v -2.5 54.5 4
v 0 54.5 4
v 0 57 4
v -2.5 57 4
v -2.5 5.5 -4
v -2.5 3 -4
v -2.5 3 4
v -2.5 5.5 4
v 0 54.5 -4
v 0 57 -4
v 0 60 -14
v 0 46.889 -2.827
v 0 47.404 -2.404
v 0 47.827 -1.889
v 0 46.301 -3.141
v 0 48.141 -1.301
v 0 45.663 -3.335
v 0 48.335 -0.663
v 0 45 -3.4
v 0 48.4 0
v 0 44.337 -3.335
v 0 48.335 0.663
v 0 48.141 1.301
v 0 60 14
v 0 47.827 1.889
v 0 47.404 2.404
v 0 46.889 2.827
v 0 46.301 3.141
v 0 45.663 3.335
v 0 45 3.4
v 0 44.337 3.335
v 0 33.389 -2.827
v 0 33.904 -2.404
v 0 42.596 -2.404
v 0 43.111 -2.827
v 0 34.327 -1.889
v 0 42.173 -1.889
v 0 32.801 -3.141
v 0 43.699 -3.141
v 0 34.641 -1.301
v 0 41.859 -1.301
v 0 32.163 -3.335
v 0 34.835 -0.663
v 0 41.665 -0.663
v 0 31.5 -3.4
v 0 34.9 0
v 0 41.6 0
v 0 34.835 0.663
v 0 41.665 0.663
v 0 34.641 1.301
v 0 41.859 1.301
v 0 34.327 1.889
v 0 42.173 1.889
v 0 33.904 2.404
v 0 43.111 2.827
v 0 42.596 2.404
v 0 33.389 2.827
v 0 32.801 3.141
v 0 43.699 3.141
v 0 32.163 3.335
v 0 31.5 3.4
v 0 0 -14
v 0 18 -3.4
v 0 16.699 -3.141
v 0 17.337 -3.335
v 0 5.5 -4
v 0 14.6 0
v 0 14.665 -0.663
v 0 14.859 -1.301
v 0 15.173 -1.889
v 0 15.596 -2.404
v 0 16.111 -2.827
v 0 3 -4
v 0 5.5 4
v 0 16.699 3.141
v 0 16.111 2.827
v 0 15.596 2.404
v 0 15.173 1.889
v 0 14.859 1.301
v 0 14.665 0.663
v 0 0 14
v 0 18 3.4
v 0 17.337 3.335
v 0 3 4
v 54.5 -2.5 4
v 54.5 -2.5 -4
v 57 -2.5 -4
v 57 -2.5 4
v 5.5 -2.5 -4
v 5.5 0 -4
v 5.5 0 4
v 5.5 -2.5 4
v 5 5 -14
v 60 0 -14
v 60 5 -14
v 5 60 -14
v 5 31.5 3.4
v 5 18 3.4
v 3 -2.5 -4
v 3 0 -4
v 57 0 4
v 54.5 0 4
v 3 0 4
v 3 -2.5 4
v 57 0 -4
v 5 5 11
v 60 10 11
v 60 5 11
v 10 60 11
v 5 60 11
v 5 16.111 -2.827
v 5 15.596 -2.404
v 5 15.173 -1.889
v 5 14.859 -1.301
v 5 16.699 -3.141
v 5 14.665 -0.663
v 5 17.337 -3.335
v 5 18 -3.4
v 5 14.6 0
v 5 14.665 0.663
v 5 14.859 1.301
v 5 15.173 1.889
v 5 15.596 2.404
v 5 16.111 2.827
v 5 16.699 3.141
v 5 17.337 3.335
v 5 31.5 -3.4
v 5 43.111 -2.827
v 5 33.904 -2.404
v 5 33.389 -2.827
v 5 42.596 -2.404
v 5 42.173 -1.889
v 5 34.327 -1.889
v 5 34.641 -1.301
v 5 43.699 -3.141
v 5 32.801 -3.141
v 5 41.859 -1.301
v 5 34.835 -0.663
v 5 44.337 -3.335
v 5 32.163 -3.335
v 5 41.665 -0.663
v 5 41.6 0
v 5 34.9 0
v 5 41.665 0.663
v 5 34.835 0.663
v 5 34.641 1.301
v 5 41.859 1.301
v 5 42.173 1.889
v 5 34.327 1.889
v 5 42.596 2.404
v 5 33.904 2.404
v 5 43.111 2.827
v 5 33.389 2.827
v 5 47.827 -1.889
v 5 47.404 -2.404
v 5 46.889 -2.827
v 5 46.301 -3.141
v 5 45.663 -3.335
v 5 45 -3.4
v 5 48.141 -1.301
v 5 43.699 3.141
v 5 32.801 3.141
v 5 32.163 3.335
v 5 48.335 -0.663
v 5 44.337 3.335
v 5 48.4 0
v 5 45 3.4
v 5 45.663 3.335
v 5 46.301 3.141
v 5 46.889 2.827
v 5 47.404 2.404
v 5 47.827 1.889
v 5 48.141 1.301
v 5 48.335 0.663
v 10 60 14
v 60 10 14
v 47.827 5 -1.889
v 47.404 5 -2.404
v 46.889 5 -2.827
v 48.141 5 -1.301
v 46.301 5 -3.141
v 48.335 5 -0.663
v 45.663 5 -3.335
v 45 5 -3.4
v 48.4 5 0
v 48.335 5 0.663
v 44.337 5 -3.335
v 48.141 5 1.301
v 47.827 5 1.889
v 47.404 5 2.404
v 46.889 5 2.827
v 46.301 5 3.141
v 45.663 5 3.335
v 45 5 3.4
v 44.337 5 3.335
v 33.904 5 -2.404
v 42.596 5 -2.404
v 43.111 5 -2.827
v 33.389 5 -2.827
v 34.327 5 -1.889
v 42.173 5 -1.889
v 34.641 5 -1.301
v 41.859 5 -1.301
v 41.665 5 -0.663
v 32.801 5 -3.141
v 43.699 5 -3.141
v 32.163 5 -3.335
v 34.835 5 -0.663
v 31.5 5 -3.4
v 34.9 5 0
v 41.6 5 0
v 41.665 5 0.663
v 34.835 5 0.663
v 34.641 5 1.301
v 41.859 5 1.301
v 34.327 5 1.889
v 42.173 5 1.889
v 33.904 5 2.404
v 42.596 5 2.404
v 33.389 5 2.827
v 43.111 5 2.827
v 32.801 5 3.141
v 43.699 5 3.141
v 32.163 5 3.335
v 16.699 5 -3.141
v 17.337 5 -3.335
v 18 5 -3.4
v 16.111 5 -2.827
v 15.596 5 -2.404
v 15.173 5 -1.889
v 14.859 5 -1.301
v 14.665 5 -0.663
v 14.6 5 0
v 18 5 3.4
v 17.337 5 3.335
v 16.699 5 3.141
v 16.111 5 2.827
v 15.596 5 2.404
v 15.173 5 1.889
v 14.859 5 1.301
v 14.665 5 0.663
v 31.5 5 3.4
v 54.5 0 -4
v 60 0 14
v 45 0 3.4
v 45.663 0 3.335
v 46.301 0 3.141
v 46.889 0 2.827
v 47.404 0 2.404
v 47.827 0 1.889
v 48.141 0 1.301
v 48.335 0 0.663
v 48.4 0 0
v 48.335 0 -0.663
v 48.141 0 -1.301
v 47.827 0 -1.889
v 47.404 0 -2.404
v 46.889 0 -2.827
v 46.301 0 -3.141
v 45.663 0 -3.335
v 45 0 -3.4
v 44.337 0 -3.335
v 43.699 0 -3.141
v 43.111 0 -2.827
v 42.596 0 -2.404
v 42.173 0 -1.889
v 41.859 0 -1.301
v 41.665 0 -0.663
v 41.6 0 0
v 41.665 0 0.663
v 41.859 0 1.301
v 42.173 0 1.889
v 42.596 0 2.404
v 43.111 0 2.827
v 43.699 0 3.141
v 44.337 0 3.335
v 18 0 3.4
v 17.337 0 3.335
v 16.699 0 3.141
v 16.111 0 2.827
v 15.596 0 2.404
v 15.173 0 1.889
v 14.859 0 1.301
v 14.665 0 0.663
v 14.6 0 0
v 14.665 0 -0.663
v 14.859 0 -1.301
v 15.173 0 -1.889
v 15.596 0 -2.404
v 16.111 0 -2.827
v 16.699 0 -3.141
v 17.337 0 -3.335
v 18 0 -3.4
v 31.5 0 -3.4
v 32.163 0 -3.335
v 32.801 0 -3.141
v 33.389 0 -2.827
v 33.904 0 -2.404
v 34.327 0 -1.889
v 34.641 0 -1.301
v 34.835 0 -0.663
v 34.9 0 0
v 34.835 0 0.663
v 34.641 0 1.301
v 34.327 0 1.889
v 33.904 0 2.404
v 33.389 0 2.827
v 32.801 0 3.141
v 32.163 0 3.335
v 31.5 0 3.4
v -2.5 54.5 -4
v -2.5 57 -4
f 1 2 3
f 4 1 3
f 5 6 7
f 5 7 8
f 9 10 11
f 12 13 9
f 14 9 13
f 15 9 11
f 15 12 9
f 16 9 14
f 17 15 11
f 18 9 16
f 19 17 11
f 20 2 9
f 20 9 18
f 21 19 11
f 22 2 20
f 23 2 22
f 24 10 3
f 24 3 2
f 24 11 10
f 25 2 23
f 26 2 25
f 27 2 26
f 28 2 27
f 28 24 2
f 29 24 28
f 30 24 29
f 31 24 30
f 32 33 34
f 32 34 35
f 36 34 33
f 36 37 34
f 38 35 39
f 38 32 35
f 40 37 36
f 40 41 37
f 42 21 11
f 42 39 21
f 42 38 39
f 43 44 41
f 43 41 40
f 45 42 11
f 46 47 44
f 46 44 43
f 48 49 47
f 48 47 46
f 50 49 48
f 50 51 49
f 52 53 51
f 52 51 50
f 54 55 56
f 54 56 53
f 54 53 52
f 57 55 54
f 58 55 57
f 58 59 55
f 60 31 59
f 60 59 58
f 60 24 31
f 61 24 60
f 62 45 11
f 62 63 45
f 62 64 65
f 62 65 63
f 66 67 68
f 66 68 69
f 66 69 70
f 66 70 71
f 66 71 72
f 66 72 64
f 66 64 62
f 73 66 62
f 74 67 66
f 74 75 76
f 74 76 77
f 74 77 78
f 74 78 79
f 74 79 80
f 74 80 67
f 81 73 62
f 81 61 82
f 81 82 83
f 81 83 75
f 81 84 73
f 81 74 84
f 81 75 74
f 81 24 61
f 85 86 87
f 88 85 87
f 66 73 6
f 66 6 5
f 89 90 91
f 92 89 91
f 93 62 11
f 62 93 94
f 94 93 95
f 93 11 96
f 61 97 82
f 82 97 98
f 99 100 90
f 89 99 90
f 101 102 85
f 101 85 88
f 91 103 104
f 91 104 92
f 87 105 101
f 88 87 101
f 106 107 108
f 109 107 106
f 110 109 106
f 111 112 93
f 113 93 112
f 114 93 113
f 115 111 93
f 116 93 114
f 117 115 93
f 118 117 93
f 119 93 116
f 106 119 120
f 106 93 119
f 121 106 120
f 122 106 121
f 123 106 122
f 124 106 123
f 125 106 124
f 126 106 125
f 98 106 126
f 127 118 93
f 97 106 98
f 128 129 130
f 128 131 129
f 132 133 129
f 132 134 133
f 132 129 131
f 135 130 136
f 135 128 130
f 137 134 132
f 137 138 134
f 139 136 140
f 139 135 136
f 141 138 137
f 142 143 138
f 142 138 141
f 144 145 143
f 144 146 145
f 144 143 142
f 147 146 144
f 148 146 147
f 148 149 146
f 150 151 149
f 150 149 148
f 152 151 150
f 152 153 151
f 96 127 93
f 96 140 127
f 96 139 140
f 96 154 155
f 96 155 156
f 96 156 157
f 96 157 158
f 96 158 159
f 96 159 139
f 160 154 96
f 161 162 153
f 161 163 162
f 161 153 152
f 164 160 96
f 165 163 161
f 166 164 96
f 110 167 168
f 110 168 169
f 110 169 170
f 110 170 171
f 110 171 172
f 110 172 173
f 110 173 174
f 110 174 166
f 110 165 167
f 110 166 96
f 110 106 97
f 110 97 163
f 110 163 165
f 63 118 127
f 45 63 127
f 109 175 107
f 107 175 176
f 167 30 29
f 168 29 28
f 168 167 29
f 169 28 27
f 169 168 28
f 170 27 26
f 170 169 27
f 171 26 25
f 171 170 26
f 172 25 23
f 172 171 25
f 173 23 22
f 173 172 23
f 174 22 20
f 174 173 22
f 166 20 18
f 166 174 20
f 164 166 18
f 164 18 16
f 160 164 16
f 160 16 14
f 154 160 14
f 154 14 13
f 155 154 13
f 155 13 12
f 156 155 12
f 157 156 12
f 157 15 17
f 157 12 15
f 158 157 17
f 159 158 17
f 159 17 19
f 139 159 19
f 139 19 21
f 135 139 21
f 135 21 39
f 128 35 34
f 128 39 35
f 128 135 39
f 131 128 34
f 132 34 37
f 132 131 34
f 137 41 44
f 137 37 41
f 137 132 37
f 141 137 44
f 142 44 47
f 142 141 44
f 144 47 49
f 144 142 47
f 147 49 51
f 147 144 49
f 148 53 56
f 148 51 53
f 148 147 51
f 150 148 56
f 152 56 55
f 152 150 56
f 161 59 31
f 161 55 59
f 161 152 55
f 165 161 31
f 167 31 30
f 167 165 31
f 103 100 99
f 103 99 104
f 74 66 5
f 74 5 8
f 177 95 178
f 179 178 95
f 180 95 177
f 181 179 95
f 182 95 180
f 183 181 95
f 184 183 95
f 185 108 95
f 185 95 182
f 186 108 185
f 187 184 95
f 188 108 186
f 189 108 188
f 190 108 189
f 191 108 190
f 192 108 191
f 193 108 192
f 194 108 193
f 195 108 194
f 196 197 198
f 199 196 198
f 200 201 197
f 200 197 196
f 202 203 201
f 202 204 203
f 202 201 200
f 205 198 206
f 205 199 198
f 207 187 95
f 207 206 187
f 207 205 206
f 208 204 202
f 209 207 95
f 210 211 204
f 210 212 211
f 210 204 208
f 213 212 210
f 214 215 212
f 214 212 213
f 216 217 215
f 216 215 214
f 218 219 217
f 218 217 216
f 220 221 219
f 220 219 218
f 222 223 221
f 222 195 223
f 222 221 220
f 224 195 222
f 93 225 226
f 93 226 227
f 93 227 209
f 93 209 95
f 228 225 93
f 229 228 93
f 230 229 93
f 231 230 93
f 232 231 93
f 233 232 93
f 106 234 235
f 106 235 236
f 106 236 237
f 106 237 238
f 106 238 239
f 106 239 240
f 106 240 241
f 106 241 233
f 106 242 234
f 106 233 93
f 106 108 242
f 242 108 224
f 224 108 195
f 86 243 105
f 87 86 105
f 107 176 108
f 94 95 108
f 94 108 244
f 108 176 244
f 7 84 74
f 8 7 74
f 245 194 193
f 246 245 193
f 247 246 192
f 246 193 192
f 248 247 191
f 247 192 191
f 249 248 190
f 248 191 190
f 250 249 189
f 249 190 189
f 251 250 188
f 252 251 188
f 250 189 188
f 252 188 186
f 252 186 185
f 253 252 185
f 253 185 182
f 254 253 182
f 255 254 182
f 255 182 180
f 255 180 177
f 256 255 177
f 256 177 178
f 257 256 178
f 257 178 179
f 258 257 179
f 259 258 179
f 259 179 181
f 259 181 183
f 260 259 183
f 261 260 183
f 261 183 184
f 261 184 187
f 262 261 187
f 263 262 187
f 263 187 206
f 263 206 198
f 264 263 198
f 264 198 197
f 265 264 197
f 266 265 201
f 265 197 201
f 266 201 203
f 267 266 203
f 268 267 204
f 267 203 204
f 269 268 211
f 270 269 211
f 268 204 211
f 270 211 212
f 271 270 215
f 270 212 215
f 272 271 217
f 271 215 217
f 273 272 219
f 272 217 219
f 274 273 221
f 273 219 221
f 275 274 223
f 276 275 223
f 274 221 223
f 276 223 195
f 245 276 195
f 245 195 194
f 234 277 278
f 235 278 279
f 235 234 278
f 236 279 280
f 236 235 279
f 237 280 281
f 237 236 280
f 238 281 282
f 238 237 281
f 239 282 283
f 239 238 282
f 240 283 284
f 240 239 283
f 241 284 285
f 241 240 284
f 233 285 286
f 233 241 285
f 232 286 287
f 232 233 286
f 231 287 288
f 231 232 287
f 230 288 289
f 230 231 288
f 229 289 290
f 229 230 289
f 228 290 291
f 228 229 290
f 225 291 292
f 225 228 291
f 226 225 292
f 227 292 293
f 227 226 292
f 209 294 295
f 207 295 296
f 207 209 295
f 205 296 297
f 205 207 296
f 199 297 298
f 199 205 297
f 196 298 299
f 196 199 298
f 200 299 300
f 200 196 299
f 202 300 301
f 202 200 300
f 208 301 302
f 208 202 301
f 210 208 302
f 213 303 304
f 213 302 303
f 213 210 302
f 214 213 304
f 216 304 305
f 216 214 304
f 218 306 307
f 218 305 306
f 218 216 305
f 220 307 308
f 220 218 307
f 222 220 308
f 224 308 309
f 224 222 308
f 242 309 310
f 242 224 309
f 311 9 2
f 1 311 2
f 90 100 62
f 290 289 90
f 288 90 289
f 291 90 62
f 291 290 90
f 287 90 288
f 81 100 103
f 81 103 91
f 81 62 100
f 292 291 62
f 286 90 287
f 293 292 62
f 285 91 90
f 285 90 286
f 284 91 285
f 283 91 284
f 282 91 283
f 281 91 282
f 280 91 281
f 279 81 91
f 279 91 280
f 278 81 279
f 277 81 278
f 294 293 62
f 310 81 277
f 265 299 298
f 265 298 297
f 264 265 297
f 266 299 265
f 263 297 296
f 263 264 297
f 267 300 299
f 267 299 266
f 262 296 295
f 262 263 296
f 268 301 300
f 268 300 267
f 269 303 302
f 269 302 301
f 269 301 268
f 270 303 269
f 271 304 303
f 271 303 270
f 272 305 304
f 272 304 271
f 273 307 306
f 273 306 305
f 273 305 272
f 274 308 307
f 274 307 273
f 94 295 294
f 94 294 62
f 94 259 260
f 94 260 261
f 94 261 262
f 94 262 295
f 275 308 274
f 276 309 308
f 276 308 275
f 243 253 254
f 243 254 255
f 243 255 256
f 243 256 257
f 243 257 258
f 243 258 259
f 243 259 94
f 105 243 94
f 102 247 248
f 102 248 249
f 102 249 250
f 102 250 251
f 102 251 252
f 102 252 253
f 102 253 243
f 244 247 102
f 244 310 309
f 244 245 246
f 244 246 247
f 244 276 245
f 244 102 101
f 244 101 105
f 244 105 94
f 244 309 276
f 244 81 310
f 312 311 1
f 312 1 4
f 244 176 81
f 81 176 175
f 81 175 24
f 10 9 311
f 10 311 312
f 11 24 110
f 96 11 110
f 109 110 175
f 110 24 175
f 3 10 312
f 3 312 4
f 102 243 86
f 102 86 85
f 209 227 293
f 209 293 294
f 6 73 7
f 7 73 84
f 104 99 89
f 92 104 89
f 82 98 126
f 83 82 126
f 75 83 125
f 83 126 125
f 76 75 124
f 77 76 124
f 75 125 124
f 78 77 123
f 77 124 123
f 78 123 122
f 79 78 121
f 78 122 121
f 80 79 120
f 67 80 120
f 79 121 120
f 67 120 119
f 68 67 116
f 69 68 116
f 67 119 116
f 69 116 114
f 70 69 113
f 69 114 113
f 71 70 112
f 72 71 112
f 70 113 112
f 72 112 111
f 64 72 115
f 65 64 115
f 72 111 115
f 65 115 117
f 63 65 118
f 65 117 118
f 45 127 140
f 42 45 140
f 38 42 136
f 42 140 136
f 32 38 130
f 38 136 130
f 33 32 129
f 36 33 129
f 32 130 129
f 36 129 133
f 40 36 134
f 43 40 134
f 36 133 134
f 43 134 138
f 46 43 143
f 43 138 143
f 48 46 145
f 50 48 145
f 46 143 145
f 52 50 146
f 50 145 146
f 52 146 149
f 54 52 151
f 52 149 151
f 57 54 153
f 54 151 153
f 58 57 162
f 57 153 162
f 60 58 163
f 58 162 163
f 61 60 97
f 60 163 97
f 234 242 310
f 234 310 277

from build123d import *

# Parameters (mm, degrees)
EXTRUDE_1_DEPTH     = 14
EXTRUDE_2_DEPTH     = 3
SKETCH_3_R          = 3.4
CUT_EXTRUDE_1_DEPTH = 6
SKETCH_4_W          = 2.5
SKETCH_4_H          = 8
EXTRUDE_3_DEPTH     = 2.5


with BuildPart() as part:
    # Эскиз1 → Бобышка-Вытянуть1 (new body, symmetric)
    with BuildSketch(Plane.XY):
        Polygon((0, 60), (0, 0), (60, 0), (60, 5), (5, 5), (5, 60), align=None)
    extrude(amount=EXTRUDE_1_DEPTH, both=True)

    # Эскиз2 → Бобышка-Вытянуть2 (add)
    with BuildSketch(Plane.XY.offset(14)):
        Polygon((60, 5), (5, 5), (5, 60), (10, 60), (60, 10), align=None)
    extrude(amount=-EXTRUDE_2_DEPTH)

    # Эскиз3 → Вырез-Вытянуть1 (cut, through all)
    with BuildSketch(Plane(origin=(0, 5, 0), x_dir=(1, 0, 0), z_dir=(0, 1, 0))):
        with Locations(Location((45, 0, 0), (0, 0, 270))):  # turned: the seam where the file's is
            Circle(SKETCH_3_R)
        with BuildLine():
            Line((18, 3.4), (31.5, 3.4))
            ThreePointArc((31.5, 3.4), (34.9, 0), (31.5, -3.4))
            Line((31.5, -3.4), (18, -3.4))
            ThreePointArc((18, -3.4), (14.6, 0), (18, 3.4))
        make_face()
    cut_extrude_1 = extrude(amount=-CUT_EXTRUDE_1_DEPTH, mode=Mode.SUBTRACT)

    # Эскиз4 → Бобышка-Вытянуть3 (add)
    with BuildSketch(Plane.XZ):
        with Locations((4.25, 0)):
            Rectangle(SKETCH_4_W, SKETCH_4_H)
        with Locations((55.75, 0)):
            Rectangle(SKETCH_4_W, SKETCH_4_H)
    extrude_3 = extrude(amount=EXTRUDE_3_DEPTH)

    # Зеркальное отражение3: Вырез-Вытянуть1, Бобышка-Вытянуть3 across plane
    add(cut_extrude_1.mirror(Plane(origin=(0, 0, 0), x_dir=(0, 0, 1), z_dir=(-0.707106781, 0.707106781, 0))), mode=Mode.SUBTRACT)
    add(extrude_3.mirror(Plane(origin=(0, 0, 0), x_dir=(0, 0, 1), z_dir=(-0.707106781, 0.707106781, 0))))


solid = part.part
